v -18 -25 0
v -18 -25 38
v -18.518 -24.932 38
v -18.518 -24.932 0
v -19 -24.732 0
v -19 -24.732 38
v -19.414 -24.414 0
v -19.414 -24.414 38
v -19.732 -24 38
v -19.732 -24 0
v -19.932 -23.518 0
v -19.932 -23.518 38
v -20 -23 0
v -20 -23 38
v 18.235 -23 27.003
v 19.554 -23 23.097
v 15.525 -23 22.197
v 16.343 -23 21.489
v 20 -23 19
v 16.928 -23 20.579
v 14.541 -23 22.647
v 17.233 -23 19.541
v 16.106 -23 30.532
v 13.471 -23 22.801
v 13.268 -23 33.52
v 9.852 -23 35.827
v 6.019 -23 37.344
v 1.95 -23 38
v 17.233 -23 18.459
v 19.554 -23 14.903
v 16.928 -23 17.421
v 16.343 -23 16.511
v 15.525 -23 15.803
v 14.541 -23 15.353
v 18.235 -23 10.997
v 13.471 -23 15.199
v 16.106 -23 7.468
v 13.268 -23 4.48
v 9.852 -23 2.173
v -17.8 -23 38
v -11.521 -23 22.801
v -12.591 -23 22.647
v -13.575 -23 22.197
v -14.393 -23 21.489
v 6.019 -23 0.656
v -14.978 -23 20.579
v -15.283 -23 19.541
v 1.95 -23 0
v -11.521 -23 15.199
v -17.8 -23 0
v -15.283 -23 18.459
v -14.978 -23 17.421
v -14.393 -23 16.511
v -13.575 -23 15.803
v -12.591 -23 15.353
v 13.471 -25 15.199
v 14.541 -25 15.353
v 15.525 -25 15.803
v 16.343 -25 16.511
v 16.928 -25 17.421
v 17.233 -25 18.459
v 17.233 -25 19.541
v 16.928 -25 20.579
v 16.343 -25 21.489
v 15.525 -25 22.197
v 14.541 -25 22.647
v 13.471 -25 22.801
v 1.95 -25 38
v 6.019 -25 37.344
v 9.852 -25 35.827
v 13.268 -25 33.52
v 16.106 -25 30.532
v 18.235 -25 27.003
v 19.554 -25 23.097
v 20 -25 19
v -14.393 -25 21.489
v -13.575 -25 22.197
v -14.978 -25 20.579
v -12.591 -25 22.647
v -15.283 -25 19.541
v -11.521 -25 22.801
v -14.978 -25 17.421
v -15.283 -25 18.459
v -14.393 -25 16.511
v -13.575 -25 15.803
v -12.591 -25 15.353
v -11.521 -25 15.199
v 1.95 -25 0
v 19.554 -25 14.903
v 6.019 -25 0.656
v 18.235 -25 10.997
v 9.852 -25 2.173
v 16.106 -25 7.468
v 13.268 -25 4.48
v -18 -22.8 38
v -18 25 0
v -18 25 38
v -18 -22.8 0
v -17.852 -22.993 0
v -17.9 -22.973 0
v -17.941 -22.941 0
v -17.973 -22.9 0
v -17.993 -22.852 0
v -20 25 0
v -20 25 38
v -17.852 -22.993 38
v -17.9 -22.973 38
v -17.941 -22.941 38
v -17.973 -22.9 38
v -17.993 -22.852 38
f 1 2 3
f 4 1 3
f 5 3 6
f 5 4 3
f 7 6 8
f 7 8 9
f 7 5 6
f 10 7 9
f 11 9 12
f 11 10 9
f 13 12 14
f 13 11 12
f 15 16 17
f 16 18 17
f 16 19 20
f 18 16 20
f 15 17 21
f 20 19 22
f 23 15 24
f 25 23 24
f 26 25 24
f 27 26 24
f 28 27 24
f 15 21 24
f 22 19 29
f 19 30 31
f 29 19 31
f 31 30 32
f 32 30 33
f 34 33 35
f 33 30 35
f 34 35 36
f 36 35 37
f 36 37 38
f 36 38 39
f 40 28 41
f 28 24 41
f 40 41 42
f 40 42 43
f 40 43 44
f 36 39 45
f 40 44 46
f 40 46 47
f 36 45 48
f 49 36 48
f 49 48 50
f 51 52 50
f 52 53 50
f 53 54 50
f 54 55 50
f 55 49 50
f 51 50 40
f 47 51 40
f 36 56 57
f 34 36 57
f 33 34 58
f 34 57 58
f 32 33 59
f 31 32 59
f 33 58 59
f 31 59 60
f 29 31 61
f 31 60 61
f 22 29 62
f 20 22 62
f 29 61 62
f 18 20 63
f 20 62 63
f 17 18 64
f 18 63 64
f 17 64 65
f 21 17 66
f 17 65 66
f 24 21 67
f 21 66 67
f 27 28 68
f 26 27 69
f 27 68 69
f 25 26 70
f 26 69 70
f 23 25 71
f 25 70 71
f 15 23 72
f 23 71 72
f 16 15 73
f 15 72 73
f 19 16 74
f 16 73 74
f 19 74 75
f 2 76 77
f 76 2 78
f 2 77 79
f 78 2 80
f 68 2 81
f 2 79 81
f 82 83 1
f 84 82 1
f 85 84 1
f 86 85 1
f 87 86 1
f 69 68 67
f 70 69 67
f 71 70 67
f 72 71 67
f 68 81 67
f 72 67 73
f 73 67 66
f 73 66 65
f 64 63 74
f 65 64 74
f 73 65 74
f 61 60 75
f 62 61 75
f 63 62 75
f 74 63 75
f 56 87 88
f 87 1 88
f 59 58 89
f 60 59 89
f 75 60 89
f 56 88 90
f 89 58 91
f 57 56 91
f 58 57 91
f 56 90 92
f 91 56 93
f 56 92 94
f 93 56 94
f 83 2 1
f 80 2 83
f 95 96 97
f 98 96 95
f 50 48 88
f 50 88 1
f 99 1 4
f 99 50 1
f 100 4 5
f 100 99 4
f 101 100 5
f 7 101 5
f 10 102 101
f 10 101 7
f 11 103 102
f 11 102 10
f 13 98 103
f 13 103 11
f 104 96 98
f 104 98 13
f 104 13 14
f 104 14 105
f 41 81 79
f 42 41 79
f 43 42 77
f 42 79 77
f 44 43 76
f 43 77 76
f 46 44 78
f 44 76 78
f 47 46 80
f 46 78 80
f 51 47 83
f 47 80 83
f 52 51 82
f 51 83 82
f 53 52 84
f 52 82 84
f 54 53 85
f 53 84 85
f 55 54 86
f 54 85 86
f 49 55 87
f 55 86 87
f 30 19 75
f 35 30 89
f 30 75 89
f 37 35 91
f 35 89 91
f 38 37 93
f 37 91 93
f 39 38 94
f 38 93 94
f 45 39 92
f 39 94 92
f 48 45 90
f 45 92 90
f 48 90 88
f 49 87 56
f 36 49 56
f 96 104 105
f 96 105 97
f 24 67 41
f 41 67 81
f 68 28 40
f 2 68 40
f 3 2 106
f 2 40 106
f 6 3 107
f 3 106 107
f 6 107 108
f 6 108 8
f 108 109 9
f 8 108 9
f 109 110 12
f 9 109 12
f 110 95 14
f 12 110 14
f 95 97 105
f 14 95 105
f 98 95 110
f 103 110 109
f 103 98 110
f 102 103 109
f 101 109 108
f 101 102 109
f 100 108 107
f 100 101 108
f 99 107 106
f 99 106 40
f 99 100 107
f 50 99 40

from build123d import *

# Parameters (mm, degrees)
SKETCH1_W           = 19
SKETCH1_H           = 2
BOSS_EXTRUDE1_DEPTH = 38
CUT_EXTRUDE1_DEPTH  = 38


with BuildPart() as part:
    # Sketch1 → Boss-Extrude1 (new body)
    with BuildSketch(Plane.XY):
        with BuildLine():
            ThreePointArc((-18.000000186, -22.8), (-17.941421543, -22.941421356), (-17.800000186, -23))
            Line((-17.800000186, -23), (1.000000186, -23))
            Line((1.000000186, -23), (1.000000186, -25))
            Line((1.000000186, -25), (-18.000000186, -25))
            ThreePointArc((-18.000000186, -25), (-19.414213749, -24.414213562), (-20.000000186, -23))
            Line((-20.000000186, -23), (-20.000000186, 23))
            Line((-20.000000186, 23), (-20.000000186, 25))
            Line((-20.000000186, 25), (-18.000000186, 25))
            Line((-18.000000186, 25), (-18.000000186, 23))
            Line((-18.000000186, 23), (-18.000000186, -22.8))
        make_face()
        with Locations((10.500000186, -24)):
            Rectangle(SKETCH1_W, SKETCH1_H)
    extrude(amount=BOSS_EXTRUDE1_DEPTH)

    # Sketch2 → Cut-Extrude1 (cut)
    with BuildSketch(Plane.XZ.offset(25)):
        with BuildLine():
            Line((20.000000186, 0), (20.000000186, 19))
            ThreePointArc((20.000000186, 19), (14.768114469, 5.896541545), (1.950000354, 0))
            Line((1.950000354, 0), (20.000000186, 0))
        make_face()
        with BuildLine():
            Line((20.000000186, 38), (1.950000354, 38))
            ThreePointArc((1.950000354, 38), (14.768114469, 32.103458455), (20.000000186, 19))
            Line((20.000000186, 19), (20.000000186, 38))
        make_face()
        with BuildLine():
            Line((13.470634361, 22.80060415), (-11.520634006, 22.80060415))
            ThreePointArc((-11.520634006, 22.80060415), (-15.321238156, 19), (-11.520634006, 15.19939585))
            Line((-11.520634006, 15.19939585), (13.470634361, 15.19939585))
            ThreePointArc((13.470634361, 15.19939585), (17.27123851, 19), (13.470634361, 22.80060415))
        make_face()
    extrude(amount=-CUT_EXTRUDE1_DEPTH, mode=Mode.SUBTRACT)


solid = part.part
